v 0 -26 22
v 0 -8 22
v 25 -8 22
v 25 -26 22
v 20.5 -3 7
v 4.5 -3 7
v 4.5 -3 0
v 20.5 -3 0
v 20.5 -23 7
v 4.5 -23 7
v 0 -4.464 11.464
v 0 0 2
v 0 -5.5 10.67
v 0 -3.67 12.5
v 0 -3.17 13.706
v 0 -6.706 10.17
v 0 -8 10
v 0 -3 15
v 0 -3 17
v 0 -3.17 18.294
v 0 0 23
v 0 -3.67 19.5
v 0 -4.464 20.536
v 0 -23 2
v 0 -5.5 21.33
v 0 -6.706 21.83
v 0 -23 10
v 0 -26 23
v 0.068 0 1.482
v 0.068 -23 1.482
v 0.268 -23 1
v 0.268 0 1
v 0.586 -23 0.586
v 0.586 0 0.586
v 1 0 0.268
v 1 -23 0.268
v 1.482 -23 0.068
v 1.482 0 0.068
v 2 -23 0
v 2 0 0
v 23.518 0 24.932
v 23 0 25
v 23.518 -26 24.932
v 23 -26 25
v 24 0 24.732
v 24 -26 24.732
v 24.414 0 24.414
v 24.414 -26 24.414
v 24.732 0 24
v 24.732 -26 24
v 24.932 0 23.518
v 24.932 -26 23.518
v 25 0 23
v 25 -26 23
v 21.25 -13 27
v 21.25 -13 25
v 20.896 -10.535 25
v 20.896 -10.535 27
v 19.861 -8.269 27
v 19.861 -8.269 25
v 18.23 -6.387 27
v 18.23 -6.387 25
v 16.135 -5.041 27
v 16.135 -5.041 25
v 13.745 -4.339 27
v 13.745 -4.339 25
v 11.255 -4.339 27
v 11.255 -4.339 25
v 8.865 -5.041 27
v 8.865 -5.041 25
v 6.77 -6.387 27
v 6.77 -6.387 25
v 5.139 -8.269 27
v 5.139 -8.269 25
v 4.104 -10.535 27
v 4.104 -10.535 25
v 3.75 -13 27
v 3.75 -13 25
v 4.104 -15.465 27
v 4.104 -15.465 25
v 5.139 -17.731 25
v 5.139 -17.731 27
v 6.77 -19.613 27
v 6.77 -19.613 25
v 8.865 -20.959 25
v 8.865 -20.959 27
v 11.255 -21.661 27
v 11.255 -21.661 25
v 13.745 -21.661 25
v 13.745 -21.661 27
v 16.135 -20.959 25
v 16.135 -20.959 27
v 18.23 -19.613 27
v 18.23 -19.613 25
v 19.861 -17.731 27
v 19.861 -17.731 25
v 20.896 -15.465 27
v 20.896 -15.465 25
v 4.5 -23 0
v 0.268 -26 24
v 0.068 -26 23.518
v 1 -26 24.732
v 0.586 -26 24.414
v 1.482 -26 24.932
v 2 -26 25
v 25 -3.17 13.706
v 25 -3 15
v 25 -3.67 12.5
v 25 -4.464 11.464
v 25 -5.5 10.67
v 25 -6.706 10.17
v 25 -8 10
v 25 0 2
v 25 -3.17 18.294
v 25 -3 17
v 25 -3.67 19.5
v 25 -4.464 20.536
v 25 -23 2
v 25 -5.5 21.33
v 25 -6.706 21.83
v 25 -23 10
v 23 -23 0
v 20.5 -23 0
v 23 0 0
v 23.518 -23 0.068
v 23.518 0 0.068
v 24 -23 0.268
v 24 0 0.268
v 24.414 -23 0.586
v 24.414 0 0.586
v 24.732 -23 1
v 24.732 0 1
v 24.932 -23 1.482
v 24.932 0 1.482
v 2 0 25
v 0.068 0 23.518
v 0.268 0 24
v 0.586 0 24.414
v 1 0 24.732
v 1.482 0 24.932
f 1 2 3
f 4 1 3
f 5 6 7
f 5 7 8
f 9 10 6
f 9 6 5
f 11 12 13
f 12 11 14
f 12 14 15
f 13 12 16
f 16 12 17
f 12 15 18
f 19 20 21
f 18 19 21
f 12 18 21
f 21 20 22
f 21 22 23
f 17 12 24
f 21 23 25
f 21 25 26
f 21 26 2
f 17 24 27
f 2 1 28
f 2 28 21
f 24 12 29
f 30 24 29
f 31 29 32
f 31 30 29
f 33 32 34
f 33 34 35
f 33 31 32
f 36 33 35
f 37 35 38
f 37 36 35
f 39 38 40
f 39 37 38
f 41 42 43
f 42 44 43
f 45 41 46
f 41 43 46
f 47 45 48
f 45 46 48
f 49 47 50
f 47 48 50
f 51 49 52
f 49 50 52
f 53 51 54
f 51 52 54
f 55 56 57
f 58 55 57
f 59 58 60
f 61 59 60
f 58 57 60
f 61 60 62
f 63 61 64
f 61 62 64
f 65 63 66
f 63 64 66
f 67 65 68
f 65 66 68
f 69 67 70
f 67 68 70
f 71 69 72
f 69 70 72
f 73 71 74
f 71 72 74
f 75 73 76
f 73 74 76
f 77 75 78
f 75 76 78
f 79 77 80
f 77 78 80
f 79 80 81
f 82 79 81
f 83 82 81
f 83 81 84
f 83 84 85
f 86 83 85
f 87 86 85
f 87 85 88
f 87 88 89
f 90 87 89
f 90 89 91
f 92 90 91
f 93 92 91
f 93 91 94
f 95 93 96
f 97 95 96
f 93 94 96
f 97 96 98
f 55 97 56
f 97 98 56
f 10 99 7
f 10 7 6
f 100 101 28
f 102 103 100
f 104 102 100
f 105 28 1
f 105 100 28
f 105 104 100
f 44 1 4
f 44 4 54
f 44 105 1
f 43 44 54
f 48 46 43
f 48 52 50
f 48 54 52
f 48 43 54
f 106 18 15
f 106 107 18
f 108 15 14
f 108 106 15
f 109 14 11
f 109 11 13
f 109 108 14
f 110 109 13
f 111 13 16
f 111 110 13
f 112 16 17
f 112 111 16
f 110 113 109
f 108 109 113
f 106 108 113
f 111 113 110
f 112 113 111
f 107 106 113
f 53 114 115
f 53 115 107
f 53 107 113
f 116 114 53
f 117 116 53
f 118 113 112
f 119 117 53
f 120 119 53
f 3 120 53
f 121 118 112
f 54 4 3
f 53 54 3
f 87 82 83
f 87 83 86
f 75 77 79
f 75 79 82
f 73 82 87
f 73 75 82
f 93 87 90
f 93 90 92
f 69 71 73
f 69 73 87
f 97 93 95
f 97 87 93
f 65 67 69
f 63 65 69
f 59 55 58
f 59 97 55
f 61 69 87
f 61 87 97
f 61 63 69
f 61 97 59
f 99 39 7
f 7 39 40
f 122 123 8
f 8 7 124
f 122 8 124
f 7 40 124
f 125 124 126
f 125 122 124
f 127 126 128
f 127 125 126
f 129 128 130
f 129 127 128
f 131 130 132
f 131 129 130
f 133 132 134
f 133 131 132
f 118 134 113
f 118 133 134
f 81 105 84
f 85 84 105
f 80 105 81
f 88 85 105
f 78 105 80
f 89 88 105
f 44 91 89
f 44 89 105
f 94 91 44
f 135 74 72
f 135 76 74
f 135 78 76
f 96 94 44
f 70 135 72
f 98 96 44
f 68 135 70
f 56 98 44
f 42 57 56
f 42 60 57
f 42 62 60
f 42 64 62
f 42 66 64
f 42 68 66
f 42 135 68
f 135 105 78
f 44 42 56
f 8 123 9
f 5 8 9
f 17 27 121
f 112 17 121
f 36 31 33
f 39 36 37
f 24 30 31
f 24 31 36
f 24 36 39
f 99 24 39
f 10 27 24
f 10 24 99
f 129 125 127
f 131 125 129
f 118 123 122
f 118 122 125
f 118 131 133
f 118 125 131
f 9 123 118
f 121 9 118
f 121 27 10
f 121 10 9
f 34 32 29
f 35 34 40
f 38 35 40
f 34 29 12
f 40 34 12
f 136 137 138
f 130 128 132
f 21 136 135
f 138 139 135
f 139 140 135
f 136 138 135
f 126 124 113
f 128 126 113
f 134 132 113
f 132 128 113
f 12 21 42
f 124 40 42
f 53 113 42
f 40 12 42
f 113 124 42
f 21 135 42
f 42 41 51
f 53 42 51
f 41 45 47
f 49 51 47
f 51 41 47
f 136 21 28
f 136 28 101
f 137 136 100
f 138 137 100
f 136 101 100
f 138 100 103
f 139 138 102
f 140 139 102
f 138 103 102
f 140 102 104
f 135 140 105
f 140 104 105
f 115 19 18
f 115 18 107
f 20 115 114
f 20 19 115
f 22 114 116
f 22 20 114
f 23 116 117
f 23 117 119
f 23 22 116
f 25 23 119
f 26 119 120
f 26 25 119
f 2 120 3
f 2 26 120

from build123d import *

# Parameters (mm, degrees)
F1_DEPTH = 3
F0_W     = 4.5
F0_H     = 7
F2_DEPTH = 23
F0_W_2   = 25
F0_H_2   = 3
F3_DEPTH = 26
F4_R     = 8.75
F5_DEPTH = 2
F6_R     = 2
F7_W     = 25
F7_H     = 3
F8_DEPTH = 20
F9_R     = 5


with BuildPart() as f1:
    # F0 (on Front) → F1 (new body)
    with BuildSketch(Plane.XZ):
        Polygon((4.5, 7), (4.5, 0), (20.5, 0), (20.5, 7), (25, 7), (25, 22), (0, 22), (0, 7), align=None)
    extrude(amount=F1_DEPTH)

    # F0 (on Front) → F2 (join)
    with BuildSketch(Plane.XZ):
        with Locations((2.25, 3.5)):
            Rectangle(F0_W, F0_H)
        with Locations((22.75, 3.5)):
            Rectangle(F0_W, F0_H)
    extrude(amount=F2_DEPTH)

    # F0 (on Front) → F3 (join)
    with BuildSketch(Plane.XZ):
        with Locations((12.5, 23.5)):
            Rectangle(F0_W_2, F0_H_2)
    extrude(amount=F3_DEPTH)

    # F4 (on face) → F5 (join)
    with BuildSketch(Plane.XY.offset(25)):
        with Locations((12.5, -13)):
            Circle(F4_R)
    extrude(amount=F5_DEPTH)

    # F6
    f6_edges = [f1.edges().sort_by_distance(p)[0] for p in [
        (0, -13, 25),
        (25, -13, 25),
        (0, -11.5, 0),
        (25, -11.5, 0),
    ]]
    fillet(f6_edges, radius=F6_R)

    # F7 (on face) → F8 (join, through all)
    with BuildSketch(Plane.XZ.offset(23)):
        with Locations((12.5, 8.5)):
            Rectangle(F7_W, F7_H)
    extrude(amount=-F8_DEPTH)

    # F9
    f9_edges = [f1.edges().sort_by_distance(p)[0] for p in [
        (12.5, -3, 10),
        (12.5, -3, 22),
    ]]
    fillet(f9_edges, radius=F9_R)


solid = f1.part
